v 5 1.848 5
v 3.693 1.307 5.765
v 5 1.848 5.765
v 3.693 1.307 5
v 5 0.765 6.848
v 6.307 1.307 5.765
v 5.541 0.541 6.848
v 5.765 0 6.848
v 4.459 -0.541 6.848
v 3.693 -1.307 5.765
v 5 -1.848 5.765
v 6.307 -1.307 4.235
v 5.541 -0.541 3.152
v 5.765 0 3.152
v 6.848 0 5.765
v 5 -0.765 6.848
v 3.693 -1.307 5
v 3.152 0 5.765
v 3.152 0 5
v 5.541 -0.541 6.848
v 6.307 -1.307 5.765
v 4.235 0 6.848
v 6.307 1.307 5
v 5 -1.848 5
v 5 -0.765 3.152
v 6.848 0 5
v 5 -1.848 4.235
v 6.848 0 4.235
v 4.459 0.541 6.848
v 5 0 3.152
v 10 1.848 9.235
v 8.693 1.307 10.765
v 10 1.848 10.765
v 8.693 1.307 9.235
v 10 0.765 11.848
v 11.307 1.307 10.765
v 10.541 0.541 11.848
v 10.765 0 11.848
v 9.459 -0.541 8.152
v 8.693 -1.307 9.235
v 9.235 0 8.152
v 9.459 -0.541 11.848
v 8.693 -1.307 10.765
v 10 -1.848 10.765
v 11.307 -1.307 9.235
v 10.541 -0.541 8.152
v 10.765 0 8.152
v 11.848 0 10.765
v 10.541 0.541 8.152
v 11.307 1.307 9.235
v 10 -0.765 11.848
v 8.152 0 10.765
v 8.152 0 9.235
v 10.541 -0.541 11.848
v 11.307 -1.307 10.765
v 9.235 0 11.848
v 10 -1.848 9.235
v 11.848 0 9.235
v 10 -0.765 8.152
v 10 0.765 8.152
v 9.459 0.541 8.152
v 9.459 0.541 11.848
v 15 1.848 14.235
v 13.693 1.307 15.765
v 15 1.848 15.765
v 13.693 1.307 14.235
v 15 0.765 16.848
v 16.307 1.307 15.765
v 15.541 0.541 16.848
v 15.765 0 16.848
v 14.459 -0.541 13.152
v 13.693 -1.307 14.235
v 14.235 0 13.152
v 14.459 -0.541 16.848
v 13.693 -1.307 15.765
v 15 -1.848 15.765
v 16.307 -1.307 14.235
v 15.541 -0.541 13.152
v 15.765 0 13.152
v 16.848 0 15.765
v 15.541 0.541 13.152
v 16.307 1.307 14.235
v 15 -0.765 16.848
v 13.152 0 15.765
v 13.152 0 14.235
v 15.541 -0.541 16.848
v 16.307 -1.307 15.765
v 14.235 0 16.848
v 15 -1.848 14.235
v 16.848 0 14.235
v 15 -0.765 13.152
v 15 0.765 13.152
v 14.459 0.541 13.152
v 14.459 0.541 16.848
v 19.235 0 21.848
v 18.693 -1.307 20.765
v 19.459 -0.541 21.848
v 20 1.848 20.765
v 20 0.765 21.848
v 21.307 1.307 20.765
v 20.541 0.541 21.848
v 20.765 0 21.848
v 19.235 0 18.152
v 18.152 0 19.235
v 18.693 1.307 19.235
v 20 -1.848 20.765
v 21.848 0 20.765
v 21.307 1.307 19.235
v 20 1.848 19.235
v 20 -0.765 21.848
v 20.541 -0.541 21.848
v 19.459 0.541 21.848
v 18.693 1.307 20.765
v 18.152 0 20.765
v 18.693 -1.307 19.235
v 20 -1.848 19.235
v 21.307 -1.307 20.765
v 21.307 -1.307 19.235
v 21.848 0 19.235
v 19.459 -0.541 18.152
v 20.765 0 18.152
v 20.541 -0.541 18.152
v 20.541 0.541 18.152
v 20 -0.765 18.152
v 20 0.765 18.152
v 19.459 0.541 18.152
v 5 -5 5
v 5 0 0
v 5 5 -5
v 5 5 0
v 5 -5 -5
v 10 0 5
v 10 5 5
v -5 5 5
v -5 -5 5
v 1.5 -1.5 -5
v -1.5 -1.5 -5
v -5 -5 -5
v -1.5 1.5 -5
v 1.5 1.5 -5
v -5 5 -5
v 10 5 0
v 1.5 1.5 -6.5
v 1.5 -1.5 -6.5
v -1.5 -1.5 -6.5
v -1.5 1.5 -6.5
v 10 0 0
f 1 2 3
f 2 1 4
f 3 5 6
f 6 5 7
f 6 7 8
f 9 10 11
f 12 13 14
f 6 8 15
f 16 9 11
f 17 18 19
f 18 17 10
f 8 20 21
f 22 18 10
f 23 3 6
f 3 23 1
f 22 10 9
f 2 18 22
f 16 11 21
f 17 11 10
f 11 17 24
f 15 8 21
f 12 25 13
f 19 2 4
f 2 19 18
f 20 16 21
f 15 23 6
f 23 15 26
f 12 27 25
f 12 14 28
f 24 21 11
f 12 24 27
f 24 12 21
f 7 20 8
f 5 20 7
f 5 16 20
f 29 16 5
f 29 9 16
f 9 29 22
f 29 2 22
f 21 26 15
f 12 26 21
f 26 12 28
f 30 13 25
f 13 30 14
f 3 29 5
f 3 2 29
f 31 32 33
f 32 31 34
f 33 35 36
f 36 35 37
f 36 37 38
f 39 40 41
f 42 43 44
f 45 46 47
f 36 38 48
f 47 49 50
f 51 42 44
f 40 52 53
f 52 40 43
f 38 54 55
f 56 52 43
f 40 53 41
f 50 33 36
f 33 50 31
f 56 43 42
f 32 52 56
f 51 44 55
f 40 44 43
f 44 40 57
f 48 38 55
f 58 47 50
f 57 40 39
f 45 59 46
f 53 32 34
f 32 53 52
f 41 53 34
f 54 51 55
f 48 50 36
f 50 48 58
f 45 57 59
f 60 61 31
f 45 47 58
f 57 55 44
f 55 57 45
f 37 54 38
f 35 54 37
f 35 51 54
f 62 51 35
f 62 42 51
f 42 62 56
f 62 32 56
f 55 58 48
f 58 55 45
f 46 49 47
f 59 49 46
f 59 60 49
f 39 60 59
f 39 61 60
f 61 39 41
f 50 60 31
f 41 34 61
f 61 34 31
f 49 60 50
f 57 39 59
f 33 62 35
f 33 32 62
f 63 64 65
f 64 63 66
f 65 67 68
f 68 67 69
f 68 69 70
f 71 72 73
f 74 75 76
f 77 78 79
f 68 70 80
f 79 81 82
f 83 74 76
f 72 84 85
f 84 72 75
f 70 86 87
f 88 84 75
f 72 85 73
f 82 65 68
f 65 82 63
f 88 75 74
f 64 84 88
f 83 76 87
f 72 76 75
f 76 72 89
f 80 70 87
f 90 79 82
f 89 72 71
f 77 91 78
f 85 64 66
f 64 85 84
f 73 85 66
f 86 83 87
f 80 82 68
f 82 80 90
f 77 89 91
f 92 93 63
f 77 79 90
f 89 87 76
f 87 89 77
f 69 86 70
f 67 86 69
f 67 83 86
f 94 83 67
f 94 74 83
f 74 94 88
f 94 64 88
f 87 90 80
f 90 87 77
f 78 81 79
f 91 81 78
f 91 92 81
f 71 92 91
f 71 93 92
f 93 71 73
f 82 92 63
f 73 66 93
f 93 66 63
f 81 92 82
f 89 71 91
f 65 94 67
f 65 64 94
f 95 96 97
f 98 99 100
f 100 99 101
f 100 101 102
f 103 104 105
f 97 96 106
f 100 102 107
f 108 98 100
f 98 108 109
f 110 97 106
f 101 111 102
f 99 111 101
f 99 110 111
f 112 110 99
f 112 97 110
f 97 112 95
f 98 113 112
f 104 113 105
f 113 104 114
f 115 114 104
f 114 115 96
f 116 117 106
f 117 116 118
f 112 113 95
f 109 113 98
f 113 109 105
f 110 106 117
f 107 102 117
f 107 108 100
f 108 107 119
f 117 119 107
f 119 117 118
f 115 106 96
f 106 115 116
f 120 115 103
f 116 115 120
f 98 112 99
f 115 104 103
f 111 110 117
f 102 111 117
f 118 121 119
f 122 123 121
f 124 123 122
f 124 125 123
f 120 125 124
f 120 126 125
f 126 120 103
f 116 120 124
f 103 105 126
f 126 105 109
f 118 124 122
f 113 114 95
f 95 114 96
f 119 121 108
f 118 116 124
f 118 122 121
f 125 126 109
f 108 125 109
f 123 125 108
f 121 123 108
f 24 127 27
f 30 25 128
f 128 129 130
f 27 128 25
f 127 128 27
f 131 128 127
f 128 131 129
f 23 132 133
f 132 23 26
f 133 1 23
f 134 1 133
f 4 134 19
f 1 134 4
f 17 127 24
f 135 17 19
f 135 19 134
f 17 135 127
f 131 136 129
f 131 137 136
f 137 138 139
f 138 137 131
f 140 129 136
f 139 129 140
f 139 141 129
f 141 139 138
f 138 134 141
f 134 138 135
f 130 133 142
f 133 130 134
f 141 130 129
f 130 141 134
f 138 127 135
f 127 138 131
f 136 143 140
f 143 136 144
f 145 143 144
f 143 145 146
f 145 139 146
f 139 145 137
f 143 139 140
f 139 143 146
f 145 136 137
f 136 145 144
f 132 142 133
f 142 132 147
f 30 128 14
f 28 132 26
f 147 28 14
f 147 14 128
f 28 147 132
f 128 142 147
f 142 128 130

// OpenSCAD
// Complex model exercising CSG, modules, functions, and loops
x = 20;

function edge(v) = v * 2;

module my_part(size) {
    translate([size, 0, 0]) cube(size);
}

// Loop generating translated spheres
for (i = [0:5:20]) {
    translate([i, 0, i]) sphere(r=2, $fn=8);
}

// Boolean difference
difference() {
    cube(size=10, center=true);
    sphere(r=7, $fn=12);
}

// Boolean intersection
intersection() {
    cube(size=10, center=true);
    sphere(r=7, $fn=12);
}

// Hull of two cubes
hull() {
    cube(2);
    translate([8, 0, 0]) cube(2);
}

// Union + cone
union() {
    cylinder(h=6, r1=2, r2=1, center=true, $fn=8);
    translate([0, 0, -5]) cube(3, center=true);
}

// Custom module call
my_part(5);
